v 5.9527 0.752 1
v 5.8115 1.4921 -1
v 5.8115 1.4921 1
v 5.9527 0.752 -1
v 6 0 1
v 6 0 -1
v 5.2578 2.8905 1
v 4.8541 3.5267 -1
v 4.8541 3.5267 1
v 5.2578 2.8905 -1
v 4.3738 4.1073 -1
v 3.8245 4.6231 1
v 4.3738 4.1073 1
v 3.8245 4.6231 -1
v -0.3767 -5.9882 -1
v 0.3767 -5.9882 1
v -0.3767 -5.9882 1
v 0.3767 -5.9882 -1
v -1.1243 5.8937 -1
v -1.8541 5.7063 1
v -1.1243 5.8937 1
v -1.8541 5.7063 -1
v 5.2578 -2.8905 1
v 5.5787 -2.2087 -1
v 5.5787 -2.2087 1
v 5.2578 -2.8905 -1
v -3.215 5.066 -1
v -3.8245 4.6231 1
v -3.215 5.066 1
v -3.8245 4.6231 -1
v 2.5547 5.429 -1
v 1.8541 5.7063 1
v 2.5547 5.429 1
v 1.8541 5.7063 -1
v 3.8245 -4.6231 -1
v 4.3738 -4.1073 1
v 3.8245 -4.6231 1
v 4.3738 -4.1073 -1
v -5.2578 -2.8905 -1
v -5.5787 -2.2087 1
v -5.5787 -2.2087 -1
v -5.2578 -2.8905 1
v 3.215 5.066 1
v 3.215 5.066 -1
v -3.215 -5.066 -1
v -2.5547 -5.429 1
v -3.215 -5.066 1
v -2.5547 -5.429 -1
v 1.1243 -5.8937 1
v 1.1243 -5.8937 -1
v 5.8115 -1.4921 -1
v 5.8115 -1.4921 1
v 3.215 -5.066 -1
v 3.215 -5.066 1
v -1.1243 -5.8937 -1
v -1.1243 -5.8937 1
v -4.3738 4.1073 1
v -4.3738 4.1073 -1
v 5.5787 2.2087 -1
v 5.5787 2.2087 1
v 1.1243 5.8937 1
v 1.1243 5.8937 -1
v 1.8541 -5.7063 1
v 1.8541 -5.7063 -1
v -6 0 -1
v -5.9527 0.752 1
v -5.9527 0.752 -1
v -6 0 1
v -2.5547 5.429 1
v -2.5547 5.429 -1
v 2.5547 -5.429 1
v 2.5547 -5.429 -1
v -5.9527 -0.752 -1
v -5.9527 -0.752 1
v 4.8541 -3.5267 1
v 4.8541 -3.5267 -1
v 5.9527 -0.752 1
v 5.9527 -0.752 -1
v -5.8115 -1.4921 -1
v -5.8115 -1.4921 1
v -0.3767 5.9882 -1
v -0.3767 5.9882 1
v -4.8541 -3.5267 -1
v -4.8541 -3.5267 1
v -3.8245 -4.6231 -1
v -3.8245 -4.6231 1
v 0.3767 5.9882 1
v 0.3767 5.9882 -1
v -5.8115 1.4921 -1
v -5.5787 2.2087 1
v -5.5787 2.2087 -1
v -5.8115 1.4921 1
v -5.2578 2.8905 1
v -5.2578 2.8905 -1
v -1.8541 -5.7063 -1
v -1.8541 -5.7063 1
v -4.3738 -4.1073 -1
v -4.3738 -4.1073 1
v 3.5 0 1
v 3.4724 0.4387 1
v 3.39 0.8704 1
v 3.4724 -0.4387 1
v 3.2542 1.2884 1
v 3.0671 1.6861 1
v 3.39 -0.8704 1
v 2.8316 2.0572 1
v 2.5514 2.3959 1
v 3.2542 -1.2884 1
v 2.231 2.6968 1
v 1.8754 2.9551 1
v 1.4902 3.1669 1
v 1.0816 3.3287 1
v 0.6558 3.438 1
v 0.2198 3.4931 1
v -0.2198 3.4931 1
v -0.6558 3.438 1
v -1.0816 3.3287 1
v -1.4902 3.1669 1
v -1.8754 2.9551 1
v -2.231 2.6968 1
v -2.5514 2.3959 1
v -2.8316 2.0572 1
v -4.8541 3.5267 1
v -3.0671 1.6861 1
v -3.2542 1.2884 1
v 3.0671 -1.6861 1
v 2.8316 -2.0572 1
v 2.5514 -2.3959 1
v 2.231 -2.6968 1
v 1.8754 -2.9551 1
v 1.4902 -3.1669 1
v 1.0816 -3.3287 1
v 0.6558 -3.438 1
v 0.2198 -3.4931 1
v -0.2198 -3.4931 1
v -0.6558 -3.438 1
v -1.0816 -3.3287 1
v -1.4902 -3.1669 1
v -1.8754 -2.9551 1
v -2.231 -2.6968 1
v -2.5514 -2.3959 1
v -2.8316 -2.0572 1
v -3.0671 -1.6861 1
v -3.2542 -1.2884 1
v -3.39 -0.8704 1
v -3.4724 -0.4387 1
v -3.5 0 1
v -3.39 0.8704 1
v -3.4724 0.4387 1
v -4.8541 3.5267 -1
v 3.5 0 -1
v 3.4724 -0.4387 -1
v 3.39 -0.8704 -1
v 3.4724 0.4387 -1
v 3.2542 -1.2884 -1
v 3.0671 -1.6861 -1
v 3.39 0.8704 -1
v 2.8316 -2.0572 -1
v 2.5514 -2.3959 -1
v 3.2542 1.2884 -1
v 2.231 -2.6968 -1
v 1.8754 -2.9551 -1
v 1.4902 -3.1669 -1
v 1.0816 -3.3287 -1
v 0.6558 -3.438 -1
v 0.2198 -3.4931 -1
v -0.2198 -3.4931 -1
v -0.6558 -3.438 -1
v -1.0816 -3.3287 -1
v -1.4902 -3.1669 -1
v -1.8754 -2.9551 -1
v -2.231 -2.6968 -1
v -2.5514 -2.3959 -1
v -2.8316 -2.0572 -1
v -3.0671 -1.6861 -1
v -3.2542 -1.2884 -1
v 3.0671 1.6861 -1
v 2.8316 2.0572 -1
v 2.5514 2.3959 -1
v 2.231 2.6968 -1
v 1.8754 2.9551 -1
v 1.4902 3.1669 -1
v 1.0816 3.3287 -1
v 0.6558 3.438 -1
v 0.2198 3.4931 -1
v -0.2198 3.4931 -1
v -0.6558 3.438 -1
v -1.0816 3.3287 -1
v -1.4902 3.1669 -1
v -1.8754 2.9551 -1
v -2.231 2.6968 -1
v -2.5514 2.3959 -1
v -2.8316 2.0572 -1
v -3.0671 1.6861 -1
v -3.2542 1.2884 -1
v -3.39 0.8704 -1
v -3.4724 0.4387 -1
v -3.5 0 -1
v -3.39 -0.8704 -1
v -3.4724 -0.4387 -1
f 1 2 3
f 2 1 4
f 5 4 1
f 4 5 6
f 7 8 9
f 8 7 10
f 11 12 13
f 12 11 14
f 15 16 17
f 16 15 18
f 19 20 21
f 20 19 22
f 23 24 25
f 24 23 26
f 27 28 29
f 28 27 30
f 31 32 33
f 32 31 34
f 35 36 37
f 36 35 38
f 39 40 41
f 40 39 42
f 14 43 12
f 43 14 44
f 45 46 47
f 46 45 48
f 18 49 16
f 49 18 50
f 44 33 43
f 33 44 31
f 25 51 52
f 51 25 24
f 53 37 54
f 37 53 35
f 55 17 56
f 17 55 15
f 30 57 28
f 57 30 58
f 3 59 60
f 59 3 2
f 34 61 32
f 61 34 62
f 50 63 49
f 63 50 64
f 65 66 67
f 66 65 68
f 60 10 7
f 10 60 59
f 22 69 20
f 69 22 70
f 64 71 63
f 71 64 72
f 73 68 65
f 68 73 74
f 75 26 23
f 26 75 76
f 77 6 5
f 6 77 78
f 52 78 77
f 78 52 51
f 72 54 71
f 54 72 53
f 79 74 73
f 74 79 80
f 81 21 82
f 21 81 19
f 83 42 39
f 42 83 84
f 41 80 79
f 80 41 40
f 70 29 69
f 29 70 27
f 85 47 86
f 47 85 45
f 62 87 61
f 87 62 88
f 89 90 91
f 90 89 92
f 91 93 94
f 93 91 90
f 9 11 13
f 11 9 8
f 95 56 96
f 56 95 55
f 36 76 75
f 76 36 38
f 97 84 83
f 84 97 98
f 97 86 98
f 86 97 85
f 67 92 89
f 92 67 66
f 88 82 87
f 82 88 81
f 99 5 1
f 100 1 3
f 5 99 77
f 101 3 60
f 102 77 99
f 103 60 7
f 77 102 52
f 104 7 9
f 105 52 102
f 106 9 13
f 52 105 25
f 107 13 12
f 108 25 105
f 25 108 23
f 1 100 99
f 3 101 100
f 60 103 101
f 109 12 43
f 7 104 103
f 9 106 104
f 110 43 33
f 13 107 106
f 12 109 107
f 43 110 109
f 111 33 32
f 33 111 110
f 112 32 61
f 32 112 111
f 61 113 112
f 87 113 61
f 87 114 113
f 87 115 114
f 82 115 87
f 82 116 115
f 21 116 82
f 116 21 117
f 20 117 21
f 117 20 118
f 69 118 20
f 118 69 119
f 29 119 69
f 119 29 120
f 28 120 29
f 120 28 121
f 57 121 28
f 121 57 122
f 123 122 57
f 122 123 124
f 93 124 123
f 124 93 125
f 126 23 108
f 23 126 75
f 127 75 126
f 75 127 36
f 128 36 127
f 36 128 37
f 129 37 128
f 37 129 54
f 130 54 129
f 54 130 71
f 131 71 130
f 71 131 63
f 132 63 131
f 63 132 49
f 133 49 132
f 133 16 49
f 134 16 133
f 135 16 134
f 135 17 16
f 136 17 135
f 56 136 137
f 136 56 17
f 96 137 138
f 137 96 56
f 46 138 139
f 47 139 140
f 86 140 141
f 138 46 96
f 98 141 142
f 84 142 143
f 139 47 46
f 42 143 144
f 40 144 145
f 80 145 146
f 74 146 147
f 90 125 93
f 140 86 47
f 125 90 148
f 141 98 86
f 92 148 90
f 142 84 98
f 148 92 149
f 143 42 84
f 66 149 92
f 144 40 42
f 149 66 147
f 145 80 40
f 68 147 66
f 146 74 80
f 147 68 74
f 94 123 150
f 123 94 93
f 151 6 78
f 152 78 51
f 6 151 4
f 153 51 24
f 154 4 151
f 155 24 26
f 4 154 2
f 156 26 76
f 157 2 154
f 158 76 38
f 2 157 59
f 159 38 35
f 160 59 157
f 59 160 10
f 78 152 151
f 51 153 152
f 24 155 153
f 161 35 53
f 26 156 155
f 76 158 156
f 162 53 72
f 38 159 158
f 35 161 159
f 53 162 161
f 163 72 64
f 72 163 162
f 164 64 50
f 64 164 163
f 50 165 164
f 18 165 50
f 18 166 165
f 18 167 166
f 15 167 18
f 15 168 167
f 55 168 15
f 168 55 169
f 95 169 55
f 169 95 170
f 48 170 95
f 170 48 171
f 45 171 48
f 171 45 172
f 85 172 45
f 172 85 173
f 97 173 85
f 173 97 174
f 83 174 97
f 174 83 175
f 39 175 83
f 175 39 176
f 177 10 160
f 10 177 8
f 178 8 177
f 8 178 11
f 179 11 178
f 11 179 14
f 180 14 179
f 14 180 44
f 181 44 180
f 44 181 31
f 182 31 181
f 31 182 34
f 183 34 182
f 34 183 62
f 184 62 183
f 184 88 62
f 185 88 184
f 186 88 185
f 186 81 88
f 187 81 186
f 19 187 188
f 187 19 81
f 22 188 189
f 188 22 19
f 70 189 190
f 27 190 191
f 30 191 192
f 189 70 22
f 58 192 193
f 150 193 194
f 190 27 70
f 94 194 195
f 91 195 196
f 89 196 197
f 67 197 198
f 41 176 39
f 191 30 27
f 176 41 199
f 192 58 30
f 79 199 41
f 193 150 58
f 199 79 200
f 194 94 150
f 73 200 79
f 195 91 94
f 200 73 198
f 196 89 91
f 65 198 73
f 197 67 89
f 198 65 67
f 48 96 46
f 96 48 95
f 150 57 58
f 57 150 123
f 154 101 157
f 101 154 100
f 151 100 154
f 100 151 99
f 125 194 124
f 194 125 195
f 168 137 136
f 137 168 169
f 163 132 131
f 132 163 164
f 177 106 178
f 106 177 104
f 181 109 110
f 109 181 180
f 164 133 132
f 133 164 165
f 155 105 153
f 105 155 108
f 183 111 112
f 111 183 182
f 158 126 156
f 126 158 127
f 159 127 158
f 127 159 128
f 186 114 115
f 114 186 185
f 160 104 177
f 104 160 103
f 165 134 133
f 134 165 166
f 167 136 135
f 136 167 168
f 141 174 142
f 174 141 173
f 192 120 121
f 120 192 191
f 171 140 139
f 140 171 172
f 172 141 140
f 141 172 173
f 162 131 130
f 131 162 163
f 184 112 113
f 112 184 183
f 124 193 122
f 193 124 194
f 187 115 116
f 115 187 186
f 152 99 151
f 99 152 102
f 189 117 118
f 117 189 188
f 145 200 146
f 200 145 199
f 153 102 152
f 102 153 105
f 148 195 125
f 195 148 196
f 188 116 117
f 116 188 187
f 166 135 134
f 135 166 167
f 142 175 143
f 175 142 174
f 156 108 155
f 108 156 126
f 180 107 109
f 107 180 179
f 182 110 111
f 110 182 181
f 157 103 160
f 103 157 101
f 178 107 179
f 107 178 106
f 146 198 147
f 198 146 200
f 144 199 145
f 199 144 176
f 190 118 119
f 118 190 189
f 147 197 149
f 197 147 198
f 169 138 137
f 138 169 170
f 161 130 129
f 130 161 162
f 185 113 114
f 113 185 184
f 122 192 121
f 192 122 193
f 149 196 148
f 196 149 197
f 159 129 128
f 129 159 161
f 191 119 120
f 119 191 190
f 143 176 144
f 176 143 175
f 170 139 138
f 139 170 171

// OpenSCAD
$fn = 50;


difference() {
	union() {
		translate(v = [0, 0, -1.0000000000]) {
			cylinder(h = 2, r = 6.0000000000);
		}
	}
	union() {
		translate(v = [0, 0, -100.0000000000]) {
			cylinder(h = 200, r = 3.5000000000);
		}
	}
}
